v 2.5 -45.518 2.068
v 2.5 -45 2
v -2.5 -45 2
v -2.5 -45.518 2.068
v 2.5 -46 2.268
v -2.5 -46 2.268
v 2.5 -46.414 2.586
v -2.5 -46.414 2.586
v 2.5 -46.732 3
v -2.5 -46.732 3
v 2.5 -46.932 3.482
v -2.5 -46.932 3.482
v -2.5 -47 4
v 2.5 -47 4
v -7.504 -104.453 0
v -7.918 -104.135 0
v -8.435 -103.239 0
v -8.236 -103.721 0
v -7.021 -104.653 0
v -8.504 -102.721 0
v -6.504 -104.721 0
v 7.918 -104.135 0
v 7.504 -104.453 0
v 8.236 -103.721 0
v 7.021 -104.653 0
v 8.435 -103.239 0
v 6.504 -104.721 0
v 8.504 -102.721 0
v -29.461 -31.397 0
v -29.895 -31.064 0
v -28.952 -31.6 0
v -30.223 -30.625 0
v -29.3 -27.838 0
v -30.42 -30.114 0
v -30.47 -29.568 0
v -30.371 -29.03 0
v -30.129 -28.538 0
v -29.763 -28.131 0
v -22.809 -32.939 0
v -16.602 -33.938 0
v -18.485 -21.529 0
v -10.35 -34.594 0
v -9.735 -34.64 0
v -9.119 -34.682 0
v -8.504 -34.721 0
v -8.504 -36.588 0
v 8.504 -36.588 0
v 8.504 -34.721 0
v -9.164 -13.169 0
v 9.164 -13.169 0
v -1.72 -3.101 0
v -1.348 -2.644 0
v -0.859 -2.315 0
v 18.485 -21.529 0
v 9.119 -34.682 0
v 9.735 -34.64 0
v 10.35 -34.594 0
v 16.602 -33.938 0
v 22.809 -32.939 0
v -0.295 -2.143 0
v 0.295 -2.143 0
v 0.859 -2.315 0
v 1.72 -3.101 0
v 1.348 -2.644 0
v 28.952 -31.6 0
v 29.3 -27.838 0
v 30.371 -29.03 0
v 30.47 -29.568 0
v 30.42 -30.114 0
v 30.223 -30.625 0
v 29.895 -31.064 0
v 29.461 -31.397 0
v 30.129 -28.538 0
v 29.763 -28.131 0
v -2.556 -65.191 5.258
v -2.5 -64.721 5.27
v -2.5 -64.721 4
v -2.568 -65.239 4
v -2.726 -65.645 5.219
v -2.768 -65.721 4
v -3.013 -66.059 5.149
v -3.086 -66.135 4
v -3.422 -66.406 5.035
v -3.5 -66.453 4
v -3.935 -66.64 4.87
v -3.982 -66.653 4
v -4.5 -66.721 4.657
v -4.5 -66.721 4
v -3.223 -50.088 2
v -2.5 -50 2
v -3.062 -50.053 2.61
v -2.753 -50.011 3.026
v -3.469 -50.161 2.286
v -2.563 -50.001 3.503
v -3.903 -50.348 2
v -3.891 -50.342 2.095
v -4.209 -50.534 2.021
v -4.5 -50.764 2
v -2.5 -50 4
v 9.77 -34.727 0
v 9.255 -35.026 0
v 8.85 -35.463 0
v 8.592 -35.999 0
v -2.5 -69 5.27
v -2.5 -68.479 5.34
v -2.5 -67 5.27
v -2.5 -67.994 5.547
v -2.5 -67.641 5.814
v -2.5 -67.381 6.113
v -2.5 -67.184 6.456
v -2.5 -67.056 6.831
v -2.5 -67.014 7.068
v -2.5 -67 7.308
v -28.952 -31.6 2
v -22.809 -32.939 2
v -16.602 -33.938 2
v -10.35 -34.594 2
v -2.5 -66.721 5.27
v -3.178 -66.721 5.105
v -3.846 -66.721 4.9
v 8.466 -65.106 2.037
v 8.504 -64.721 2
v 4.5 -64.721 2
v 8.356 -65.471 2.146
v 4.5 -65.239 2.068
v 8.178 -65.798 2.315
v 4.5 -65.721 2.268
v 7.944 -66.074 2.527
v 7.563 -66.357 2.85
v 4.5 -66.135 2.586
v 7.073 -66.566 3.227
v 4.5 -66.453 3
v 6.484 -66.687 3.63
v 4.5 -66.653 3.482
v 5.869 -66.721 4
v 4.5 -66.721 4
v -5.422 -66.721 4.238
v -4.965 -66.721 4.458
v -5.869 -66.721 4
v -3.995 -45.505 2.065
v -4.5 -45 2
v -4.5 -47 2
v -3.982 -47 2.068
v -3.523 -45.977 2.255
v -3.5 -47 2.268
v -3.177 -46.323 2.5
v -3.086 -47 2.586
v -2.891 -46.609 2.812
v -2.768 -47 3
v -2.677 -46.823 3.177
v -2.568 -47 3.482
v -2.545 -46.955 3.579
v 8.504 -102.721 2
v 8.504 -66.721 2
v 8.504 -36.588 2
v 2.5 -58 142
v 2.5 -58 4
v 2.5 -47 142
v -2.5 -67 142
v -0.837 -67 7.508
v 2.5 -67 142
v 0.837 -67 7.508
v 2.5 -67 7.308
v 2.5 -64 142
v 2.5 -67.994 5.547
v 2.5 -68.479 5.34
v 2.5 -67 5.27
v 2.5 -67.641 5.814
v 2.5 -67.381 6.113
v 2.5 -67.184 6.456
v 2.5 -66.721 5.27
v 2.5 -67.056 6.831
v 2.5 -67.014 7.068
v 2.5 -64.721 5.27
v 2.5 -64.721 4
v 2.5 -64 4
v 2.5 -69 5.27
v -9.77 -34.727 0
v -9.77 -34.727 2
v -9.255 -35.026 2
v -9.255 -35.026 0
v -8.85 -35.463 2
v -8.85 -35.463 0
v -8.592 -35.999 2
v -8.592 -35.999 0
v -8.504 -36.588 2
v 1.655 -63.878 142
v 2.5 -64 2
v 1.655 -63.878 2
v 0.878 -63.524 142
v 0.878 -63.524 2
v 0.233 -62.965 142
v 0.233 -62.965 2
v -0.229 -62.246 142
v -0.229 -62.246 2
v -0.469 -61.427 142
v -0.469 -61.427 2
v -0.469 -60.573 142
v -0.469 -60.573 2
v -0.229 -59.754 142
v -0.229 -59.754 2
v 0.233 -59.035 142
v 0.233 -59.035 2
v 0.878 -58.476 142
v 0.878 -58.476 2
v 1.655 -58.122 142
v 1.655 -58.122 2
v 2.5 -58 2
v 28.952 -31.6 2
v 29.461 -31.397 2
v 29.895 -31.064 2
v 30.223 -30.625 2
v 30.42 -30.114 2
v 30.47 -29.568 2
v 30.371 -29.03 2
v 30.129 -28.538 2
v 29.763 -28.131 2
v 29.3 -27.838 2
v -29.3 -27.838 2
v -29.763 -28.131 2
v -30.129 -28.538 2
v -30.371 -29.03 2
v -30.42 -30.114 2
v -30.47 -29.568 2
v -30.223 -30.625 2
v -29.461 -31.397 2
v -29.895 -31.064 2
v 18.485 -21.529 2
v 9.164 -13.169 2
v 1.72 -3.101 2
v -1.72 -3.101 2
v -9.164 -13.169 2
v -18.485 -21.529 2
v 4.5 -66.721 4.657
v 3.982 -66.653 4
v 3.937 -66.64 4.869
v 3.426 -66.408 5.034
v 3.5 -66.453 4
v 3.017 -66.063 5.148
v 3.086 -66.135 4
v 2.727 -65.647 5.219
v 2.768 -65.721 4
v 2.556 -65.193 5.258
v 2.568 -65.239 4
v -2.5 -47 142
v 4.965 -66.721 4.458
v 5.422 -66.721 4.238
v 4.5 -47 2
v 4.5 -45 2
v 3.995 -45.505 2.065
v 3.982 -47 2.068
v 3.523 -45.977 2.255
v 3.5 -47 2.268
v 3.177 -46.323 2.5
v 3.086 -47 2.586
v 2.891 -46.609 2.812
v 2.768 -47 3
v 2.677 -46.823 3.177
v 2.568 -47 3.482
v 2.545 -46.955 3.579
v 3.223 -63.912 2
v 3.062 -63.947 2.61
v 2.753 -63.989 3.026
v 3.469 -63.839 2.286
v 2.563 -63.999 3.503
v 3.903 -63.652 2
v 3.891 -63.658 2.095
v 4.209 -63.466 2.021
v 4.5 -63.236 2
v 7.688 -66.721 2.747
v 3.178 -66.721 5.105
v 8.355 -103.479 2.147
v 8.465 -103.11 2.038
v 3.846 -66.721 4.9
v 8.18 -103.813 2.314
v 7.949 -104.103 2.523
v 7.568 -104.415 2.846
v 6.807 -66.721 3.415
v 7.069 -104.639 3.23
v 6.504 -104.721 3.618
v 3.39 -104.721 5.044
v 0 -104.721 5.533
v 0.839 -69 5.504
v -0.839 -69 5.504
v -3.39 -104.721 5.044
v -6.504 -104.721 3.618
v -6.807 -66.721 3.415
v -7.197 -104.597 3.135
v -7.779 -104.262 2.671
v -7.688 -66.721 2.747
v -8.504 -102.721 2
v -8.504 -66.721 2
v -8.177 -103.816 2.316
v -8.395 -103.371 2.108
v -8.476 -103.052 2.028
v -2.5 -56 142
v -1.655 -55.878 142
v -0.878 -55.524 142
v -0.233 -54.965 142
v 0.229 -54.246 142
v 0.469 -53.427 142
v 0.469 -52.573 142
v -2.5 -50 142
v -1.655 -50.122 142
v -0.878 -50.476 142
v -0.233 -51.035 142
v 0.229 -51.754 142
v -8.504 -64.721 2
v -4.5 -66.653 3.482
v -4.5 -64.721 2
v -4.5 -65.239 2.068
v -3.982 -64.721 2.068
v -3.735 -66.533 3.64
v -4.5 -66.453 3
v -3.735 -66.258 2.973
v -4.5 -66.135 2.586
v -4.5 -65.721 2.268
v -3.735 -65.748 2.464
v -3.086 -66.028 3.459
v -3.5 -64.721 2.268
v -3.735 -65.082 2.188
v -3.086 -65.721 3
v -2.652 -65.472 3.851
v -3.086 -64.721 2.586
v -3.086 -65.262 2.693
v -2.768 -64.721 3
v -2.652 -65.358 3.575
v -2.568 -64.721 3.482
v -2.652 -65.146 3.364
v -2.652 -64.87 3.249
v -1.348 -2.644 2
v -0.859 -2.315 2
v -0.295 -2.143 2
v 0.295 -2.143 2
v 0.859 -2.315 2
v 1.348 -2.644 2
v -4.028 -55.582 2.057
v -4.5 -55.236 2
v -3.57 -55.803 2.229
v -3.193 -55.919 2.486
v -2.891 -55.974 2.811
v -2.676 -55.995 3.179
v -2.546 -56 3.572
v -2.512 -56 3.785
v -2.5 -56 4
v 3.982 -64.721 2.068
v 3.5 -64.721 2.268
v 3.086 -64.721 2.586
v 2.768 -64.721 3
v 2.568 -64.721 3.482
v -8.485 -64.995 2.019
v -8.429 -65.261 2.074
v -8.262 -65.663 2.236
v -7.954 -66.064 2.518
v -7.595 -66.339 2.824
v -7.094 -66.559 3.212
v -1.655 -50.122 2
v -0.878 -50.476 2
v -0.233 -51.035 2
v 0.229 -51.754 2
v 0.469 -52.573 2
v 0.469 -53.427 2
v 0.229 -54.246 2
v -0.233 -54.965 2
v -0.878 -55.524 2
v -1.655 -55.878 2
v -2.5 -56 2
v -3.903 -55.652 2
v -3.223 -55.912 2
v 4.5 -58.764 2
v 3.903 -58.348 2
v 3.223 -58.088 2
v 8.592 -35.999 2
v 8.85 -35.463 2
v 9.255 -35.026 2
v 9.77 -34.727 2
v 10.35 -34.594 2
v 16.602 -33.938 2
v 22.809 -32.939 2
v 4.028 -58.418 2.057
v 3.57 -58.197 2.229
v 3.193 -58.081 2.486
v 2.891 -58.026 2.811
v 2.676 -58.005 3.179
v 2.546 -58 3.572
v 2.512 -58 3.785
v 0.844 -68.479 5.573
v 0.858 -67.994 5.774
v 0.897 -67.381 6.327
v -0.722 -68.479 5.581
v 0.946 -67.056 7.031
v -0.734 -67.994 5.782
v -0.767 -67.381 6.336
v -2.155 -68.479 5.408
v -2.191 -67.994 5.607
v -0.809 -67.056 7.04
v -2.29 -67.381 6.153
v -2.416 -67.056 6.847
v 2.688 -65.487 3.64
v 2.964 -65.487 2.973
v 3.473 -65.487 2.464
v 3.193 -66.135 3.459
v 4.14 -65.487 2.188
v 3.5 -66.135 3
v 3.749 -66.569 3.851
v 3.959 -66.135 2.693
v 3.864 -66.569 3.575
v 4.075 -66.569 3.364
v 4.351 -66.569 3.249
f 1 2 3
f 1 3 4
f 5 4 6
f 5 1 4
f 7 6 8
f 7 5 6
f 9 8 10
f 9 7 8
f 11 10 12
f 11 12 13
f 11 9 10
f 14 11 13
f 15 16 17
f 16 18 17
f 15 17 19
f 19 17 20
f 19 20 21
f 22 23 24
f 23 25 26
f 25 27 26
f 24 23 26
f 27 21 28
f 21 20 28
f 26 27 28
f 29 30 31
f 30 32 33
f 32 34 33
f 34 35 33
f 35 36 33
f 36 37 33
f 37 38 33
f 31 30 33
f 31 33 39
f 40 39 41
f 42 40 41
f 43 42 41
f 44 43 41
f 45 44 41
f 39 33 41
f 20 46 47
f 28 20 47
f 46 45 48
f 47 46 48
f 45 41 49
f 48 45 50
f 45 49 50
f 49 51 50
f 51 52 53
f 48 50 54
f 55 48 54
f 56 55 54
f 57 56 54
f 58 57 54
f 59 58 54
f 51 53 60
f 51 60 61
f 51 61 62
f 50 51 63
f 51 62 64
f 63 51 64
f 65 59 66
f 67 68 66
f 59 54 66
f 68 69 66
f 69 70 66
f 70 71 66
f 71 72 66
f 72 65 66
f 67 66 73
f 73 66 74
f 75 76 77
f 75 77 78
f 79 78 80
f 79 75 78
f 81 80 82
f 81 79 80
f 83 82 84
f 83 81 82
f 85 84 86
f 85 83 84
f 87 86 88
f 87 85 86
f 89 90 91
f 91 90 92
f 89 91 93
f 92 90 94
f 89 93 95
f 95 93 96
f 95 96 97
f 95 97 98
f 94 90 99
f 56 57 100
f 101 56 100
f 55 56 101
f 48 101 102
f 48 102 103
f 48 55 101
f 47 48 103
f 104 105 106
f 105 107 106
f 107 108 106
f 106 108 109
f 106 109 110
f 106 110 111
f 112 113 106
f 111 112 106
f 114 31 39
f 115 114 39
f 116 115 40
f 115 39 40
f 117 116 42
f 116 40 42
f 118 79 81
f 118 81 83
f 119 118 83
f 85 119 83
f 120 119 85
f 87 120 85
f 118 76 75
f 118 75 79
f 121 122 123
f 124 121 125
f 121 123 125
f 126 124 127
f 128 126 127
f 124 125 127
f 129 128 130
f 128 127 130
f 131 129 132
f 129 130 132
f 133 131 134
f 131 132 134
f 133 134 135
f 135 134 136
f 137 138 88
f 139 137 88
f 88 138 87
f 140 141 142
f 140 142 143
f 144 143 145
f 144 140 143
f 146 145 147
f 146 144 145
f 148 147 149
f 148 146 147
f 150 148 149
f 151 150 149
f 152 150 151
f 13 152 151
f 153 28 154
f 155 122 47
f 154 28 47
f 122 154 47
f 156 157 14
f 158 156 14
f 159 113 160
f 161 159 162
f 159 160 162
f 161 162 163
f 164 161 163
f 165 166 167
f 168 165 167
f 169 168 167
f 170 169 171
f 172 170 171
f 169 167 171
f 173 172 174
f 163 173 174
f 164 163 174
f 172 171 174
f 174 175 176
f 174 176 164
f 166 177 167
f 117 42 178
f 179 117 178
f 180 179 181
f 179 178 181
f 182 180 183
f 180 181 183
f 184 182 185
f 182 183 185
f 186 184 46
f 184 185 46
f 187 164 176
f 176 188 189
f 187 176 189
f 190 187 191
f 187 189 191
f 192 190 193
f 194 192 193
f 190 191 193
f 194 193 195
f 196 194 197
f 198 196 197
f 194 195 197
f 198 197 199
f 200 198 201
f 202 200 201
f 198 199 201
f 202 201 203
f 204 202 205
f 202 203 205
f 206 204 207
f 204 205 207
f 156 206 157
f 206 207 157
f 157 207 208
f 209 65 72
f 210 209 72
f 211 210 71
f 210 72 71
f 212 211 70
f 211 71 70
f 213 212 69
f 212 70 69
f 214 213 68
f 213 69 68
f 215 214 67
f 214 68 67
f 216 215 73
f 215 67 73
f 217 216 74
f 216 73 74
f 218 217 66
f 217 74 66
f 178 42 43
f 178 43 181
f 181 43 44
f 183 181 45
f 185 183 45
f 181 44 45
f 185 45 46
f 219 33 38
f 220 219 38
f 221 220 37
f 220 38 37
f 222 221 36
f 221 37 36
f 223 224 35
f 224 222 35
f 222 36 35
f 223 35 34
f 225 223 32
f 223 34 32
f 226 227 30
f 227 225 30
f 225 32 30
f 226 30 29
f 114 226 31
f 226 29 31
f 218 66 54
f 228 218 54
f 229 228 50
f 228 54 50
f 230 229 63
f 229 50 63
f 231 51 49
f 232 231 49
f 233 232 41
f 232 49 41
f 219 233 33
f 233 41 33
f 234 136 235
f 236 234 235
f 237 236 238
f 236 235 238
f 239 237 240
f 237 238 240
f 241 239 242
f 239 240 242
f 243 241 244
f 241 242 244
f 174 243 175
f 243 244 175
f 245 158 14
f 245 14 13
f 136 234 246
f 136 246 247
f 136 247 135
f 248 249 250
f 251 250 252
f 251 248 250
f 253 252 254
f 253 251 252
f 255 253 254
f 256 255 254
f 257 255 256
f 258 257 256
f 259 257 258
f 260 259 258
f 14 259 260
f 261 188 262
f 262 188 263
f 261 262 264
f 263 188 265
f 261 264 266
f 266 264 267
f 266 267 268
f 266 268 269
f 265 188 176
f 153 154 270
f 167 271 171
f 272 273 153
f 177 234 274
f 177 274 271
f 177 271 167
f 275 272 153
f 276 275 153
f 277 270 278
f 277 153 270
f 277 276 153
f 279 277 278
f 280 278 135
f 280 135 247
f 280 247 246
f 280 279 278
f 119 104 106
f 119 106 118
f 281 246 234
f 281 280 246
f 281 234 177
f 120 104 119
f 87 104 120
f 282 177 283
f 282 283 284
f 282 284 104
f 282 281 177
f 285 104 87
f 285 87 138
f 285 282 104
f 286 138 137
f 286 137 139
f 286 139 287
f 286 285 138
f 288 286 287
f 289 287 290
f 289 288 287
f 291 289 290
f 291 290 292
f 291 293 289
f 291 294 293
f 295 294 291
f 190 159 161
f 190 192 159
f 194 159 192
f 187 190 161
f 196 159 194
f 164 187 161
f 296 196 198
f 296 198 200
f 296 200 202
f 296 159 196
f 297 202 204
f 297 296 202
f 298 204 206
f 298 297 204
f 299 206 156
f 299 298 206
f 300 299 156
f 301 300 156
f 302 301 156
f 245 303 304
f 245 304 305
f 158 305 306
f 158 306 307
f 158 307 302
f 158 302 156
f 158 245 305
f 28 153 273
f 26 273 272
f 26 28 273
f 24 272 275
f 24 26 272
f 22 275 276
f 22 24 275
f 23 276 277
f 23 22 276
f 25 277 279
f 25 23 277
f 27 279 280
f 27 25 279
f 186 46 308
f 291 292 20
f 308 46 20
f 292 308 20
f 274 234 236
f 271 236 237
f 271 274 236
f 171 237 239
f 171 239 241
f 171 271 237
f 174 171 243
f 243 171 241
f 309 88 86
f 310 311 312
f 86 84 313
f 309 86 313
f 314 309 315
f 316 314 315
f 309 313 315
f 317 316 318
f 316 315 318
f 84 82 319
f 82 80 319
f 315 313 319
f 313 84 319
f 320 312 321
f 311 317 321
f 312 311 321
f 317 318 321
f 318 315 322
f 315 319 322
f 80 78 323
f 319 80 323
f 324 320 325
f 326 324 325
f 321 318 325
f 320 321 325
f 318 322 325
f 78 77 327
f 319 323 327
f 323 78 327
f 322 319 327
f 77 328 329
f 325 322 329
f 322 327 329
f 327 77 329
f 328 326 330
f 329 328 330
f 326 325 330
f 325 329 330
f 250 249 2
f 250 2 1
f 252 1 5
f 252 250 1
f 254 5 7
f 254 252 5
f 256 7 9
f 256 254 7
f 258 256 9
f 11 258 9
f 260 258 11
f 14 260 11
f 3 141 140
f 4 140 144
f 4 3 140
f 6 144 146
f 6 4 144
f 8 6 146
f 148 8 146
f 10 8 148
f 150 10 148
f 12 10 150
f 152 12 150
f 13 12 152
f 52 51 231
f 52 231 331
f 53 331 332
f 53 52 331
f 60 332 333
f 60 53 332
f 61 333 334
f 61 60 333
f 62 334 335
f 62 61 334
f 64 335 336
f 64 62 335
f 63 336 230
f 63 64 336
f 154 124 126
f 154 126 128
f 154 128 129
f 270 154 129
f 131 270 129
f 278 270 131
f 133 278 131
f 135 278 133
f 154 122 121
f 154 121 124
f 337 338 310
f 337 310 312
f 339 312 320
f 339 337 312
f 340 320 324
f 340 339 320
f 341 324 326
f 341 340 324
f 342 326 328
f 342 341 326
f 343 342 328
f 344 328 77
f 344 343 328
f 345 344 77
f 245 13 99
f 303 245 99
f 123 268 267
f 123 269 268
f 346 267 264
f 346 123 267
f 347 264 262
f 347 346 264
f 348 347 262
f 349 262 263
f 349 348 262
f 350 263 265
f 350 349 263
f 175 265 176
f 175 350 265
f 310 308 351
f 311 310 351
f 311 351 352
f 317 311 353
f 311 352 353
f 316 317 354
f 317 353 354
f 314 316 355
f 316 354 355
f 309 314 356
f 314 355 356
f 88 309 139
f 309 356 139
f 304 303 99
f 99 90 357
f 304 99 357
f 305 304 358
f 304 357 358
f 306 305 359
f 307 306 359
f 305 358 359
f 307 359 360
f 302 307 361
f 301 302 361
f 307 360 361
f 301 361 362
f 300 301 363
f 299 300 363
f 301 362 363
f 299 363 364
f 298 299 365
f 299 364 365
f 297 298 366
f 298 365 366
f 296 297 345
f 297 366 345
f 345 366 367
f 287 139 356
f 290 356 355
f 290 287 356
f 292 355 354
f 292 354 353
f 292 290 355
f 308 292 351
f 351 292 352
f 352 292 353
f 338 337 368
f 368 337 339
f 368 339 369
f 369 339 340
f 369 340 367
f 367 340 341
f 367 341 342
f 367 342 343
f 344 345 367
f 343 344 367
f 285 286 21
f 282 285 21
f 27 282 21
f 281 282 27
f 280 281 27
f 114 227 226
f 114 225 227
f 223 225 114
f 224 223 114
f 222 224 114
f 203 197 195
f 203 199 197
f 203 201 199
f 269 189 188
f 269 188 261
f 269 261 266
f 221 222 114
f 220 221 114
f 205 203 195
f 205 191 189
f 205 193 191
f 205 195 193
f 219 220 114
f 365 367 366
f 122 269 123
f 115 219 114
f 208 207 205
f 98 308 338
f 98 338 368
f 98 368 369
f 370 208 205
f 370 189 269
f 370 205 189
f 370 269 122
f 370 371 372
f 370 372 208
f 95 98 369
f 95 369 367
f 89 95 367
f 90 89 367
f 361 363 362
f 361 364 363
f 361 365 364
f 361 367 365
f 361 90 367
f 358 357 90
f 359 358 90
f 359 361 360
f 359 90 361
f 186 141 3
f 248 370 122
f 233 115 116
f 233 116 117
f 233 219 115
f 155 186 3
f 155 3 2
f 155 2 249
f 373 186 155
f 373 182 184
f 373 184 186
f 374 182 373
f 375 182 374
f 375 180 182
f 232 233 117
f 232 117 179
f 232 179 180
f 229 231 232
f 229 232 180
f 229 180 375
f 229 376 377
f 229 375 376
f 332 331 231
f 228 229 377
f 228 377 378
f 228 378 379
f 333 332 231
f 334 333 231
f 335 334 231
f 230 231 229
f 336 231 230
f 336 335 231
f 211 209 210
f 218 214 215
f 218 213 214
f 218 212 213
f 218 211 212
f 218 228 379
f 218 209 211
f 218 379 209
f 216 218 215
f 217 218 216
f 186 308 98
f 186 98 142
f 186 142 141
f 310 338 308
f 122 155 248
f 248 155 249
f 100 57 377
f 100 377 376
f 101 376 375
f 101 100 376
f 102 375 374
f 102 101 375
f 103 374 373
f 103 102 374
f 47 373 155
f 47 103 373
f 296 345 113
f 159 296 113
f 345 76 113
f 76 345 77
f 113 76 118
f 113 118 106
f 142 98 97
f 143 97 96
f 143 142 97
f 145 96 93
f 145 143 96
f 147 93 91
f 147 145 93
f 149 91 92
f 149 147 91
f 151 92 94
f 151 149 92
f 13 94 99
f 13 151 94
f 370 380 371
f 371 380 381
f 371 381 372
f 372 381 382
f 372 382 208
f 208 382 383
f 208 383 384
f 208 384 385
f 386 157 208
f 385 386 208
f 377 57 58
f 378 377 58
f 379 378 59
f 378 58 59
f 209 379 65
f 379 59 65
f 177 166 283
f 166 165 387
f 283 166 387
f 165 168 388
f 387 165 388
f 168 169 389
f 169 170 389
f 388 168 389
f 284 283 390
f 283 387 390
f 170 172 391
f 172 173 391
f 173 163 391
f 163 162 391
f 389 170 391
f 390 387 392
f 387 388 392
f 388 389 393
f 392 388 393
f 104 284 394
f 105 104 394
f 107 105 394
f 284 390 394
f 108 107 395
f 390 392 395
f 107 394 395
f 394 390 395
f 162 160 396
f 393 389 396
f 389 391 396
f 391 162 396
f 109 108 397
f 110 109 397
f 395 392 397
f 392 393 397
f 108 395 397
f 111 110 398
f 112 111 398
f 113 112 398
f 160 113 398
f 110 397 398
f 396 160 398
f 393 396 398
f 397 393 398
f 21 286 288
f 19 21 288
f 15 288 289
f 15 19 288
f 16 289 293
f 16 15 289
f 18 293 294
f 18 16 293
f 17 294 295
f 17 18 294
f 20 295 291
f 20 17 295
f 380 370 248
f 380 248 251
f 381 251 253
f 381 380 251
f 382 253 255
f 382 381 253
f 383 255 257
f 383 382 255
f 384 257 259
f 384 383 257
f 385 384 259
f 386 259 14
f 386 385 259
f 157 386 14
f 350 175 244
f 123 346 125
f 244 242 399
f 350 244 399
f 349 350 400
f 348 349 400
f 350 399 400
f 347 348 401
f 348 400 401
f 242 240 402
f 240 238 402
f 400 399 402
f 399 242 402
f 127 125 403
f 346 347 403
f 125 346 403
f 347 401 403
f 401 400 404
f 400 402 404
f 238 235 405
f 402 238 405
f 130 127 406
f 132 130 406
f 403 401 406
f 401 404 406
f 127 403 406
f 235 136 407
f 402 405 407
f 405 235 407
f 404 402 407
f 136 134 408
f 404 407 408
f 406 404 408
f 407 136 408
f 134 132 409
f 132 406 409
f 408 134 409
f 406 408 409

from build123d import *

# Parameters (mm, degrees)
F1_DEPTH      = 2
F3_DEPTH      = 140
F5_DEPTH      = 38
F6_S2_W       = 2
F6_S2_H       = 2
F6_T3_DEPTH   = 2
F6_S7_W       = 2
F6_S7_H       = 2
F6_T8_DEPTH   = 2
F6_T13_DEPTH  = 16
F6_S14_R      = 3
F6_T15_DEPTH  = 10
F6_T18_DEPTH  = 8
F6_S19_R      = 3
F6_T20_DEPTH  = 6
F6_T23_DEPTH  = 5
F6_T26_DEPTH  = 2
F6_T29_DEPTH  = 2
F6_T32_DEPTH  = 6.2698148841
F6_S33_R      = 12
F6_T34_DEPTH  = 5
F6_T37_DEPTH  = 4.0036432176
F6_S38_R      = 12
F6_T39_DEPTH  = 4
F6_T42_DEPTH  = 6.2698148841
F6_S43_R      = 12
F6_T44_DEPTH  = 5
F6_T47_DEPTH  = 4.0036432176
F6_S48_R      = 12
F6_T49_DEPTH  = 4
F6_T52_DEPTH  = 13.7211477996
F6_S53_R      = 3
F6_T54_DEPTH  = 9
F6_T57_DEPTH  = 5.7211477996
F6_S58_R      = 3
F6_T59_DEPTH  = 5
F6_T62_ANGLE  = 71.7972504735
F6_T68_DEPTH  = 21
F6_T72_DEPTH  = 10
F6_T78_DEPTH  = 10
F6_T82_DEPTH  = 13
F6_T88_DEPTH  = 12
F6_T91_DEPTH  = 12
F6_T94_DEPTH  = 32.0377713688
F6_T97_DEPTH  = 32.0377713688
F6_T100_DEPTH = 19.7312172526


# Not quite as in the source:
# - a fillet or chamfer that OpenCascade refuses, or shapes differently, is made with other operations: its cross-section is extruded or revolved along the edge and cut away or added


with BuildPart() as f1:
    # F0 (on Top) → F1 (new body)
    with BuildSketch(Plane.XY):
        with BuildLine():
            ThreePointArc((-34.7443990516, -30.0072931229), (-21.7619757905, -33.1321767709), (-8.5036432176, -34.7211477996))
            Line((-8.5036432176, -34.7211477996), (-8.5036432176, -104.7211477996))
            Line((-8.5036432176, -104.7211477996), (0, -104.7211477996))
            Line((0, -104.7211477996), (8.5036432176, -104.7211477996))
            Line((8.5036432176, -104.7211477996), (8.5036432176, -34.7211477996))
            ThreePointArc((8.5036432176, -34.7211477996), (21.7619757905, -33.1321767709), (34.7443990516, -30.0072931229))
            ThreePointArc((34.7443990516, -30.0072931229), (14.4817817228, -18.350360614), (0, 0))
            ThreePointArc((0, 0), (-14.4817817228, -18.350360614), (-34.7443990516, -30.0072931229))
        make_face()
    extrude(amount=F1_DEPTH)

    # F2 (on face) → F3 (join)
    with BuildSketch(Plane.XY.offset(2)):
        with BuildLine():
            Line((-2.5, -67), (2.5, -67))
            Line((2.5, -67), (2.5, -64))
            ThreePointArc((2.5, -64), (-0.5, -61), (2.5, -58))
            Line((2.5, -58), (2.5, -47))
            Line((2.5, -47), (-2.5, -47))
            Line((-2.5, -47), (-2.5, -50))
            ThreePointArc((-2.5, -50), (0.5, -53), (-2.5, -56))
            Line((-2.5, -56), (-2.5, -67))
        make_face()
    extrude(amount=F3_DEPTH)

    # F4 (on face) → F5 (join)
    with BuildSketch(Plane.XZ.offset(104.7211477996)):
        with BuildLine():
            ThreePointArc((8.5036432176, 2), (0, 5.5331202898), (-8.5036432176, 2))
            Line((-8.5036432176, 2), (8.5036432176, 2))
        make_face()
    extrude(amount=-F5_DEPTH)

    # F6: fillet of radius 2 on 17 edges, made by hand


with BuildPart() as f6_tool1:
    # F6_s2 → F6_t3 (new body)
    with BuildSketch(Plane.XZ.offset(64.7211477996)):
        with Locations((3.5, 3)):
            Rectangle(F6_S2_W, F6_S2_H)
    extrude(amount=F6_T3_DEPTH)

    # F6_s4 → F6_t5 (revolve, cut)
    with BuildSketch(Plane(origin=(4.5, -64.7211477996, 4), x_dir=(0.7071067812, 0, 0.7071067812), z_dir=(0.7071067812, 0, -0.7071067812))):
        with BuildLine():
            ThreePointArc((0, -2), (2, 0), (0, 2))
            Line((0, 2), (0, -2))
        make_face()
    revolve(axis=Axis((4.5, -64.7211477996, 4), (0, -1, 0)), mode=Mode.SUBTRACT)


with BuildPart() as f6_tool6:
    # F6_s7 → F6_t8 (new body)
    with BuildSketch(Plane.YZ.offset(-4.5)):
        with Locations((-65.7211477996, 3)):
            Rectangle(F6_S7_W, F6_S7_H)
    extrude(amount=F6_T8_DEPTH)

    # F6_s9 → F6_t10 (revolve, cut)
    with BuildSketch(Plane(origin=(-4.5, -64.7211477996, 4), x_dir=(0, 0.7071067812, 0.7071067812), z_dir=(0, 0.7071067812, -0.7071067812))):
        with BuildLine():
            ThreePointArc((0, -2), (2, 0), (0, 2))
            Line((0, 2), (0, -2))
        make_face()
    revolve(axis=Axis((-4.5, -64.7211477996, 4), (1, 0, 0)), mode=Mode.SUBTRACT)


with BuildPart() as f6_tool11:
    # F6_s12 → F6_t13 (new body)
    with BuildSketch(Plane.XZ.offset(63)):
        with BuildLine():
            ThreePointArc((4.5, 2), (3.0857864376, 2.5857864376), (2.5, 4))
            Line((2.5, 4), (2.5, 2))
            Line((2.5, 2), (4.5, 2))
        make_face()
    extrude(amount=-F6_T13_DEPTH)

    # F6_s14 → F6_t15 (cut, symmetric)
    with BuildSketch(Plane.XY.offset(3)):
        with Locations((2.5, -61)):
            Circle(F6_S14_R)
    extrude(amount=F6_T15_DEPTH, both=True, mode=Mode.SUBTRACT)


with BuildPart() as f6_tool16:
    # F6_s17 → F6_t18 (new body)
    with BuildSketch(Plane.XZ.offset(47)):
        with BuildLine():
            ThreePointArc((-4.5, 2), (-3.0857864376, 2.5857864376), (-2.5, 4))
            Line((-2.5, 4), (-2.5, 2))
            Line((-2.5, 2), (-4.5, 2))
        make_face()
    extrude(amount=F6_T18_DEPTH)

    # F6_s19 → F6_t20 (cut, symmetric)
    with BuildSketch(Plane.XY.offset(3)):
        with Locations((-2.5, -53)):
            Circle(F6_S19_R)
    extrude(amount=F6_T20_DEPTH, both=True, mode=Mode.SUBTRACT)


with BuildPart() as f6_tool21:
    # F6_s22 → F6_t23 (new body)
    with BuildSketch(Plane.YZ.offset(2.5)):
        with BuildLine():
            ThreePointArc((-45, 2), (-46.4142135624, 2.5857864376), (-47, 4))
            Line((-47, 4), (-47, 2))
            Line((-47, 2), (-45, 2))
        make_face()
    extrude(amount=-F6_T23_DEPTH)


with BuildPart() as f6_tool24:
    # F6_s25 → F6_t26 (new body)
    with BuildSketch(Plane.XY):
        with BuildLine():
            ThreePointArc((-10.349778168, -34.5937272007), (-9.0360380086, -35.2290743164), (-8.5036432176, -36.5877998039))
            Line((-8.5036432176, -36.5877998039), (-8.5036432176, -34.7211477996))
            ThreePointArc((-8.5036432176, -34.7211477996), (-9.4269686479, -34.6611748852), (-10.349778168, -34.5937272007))
        make_face()
    extrude(amount=F6_T26_DEPTH)


with BuildPart() as f6_tool27:
    # F6_s28 → F6_t29 (new body)
    with BuildSketch(Plane.XY):
        with BuildLine():
            ThreePointArc((10.349778168, -34.5937272007), (9.0360380086, -35.2290743164), (8.5036432176, -36.5877998039))
            Line((8.5036432176, -36.5877998039), (8.5036432176, -34.7211477996))
            ThreePointArc((8.5036432176, -34.7211477996), (9.4269686479, -34.6611748852), (10.349778168, -34.5937272007))
        make_face()
    extrude(amount=F6_T29_DEPTH)


with BuildPart() as f6_tool30:
    # F6_s31 → F6_t32 (new body)
    with BuildSketch(Plane.XY.offset(4)):
        with BuildLine():
            ThreePointArc((4.5, -66.7211477996), (3.0857864376, -66.135361362), (2.5, -64.7211477996))
            Line((2.5, -64.7211477996), (2.5, -66.7211477996))
            Line((2.5, -66.7211477996), (4.5, -66.7211477996))
        make_face()
    extrude(amount=F6_T32_DEPTH)

    # F6_s33 → F6_t34 (intersect, symmetric)
    with BuildSketch(Plane.XZ.offset(65.7)):
        with Locations((0, -6.4668797102)):
            Circle(F6_S33_R)
    extrude(amount=F6_T34_DEPTH, both=True, mode=Mode.INTERSECT)


with BuildPart() as f6_tool35:
    # F6_s36 → F6_t37 (new body)
    with BuildSketch(Plane.YZ.offset(4.5)):
        with BuildLine():
            ThreePointArc((-64.7211477996, 2), (-66.135361362, 2.5857864376), (-66.7211477996, 4))
            Line((-66.7211477996, 4), (-66.7211477996, 2))
            Line((-66.7211477996, 2), (-64.7211477996, 2))
        make_face()
    extrude(amount=F6_T37_DEPTH)

    # F6_s38 → F6_t39 (intersect, symmetric)
    with BuildSketch(Plane.XZ.offset(65.7)):
        with Locations((0, -6.4668797102)):
            Circle(F6_S38_R)
    extrude(amount=F6_T39_DEPTH, both=True, mode=Mode.INTERSECT)


with BuildPart() as f6_tool40:
    # F6_s41 → F6_t42 (new body)
    with BuildSketch(Plane.XY.offset(10.2698148841)):
        with BuildLine():
            ThreePointArc((-2.5, -64.7211477996), (-3.0857864376, -66.135361362), (-4.5, -66.7211477996))
            Line((-4.5, -66.7211477996), (-2.5, -66.7211477996))
            Line((-2.5, -66.7211477996), (-2.5, -64.7211477996))
        make_face()
    extrude(amount=-F6_T42_DEPTH)

    # F6_s43 → F6_t44 (intersect, symmetric)
    with BuildSketch(Plane.XZ.offset(65.7)):
        with Locations((0, -6.4668797102)):
            Circle(F6_S43_R)
    extrude(amount=F6_T44_DEPTH, both=True, mode=Mode.INTERSECT)


with BuildPart() as f6_tool45:
    # F6_s46 → F6_t47 (new body)
    with BuildSketch(Plane.YZ.offset(-8.5036432176)):
        with BuildLine():
            ThreePointArc((-64.7211477996, 2), (-66.135361362, 2.5857864376), (-66.7211477996, 4))
            Line((-66.7211477996, 4), (-66.7211477996, 2))
            Line((-66.7211477996, 2), (-64.7211477996, 2))
        make_face()
    extrude(amount=F6_T47_DEPTH)

    # F6_s48 → F6_t49 (intersect, symmetric)
    with BuildSketch(Plane.XZ.offset(65.7)):
        with Locations((0, -6.4668797102)):
            Circle(F6_S48_R)
    extrude(amount=F6_T49_DEPTH, both=True, mode=Mode.INTERSECT)


with BuildPart() as f6_tool50:
    # F6_s51 → F6_t52 (new body)
    with BuildSketch(Plane.XZ.offset(51)):
        with BuildLine():
            ThreePointArc((-4.5, 2), (-3.0857864376, 2.5857864376), (-2.5, 4))
            Line((-2.5, 4), (-2.5, 2))
            Line((-2.5, 2), (-4.5, 2))
        make_face()
    extrude(amount=F6_T52_DEPTH)

    # F6_s53 → F6_t54 (cut, symmetric)
    with BuildSketch(Plane.XY.offset(3)):
        with Locations((-2.5, -53)):
            Circle(F6_S53_R)
    extrude(amount=F6_T54_DEPTH, both=True, mode=Mode.SUBTRACT)


with BuildPart() as f6_tool55:
    # F6_s56 → F6_t57 (new body)
    with BuildSketch(Plane.XZ.offset(64.7211477996)):
        with BuildLine():
            ThreePointArc((4.5, 2), (3.0857864376, 2.5857864376), (2.5, 4))
            Line((2.5, 4), (2.5, 2))
            Line((2.5, 2), (4.5, 2))
        make_face()
    extrude(amount=-F6_T57_DEPTH)

    # F6_s58 → F6_t59 (cut, symmetric)
    with BuildSketch(Plane.XY.offset(3)):
        with Locations((2.5, -61)):
            Circle(F6_S58_R)
    extrude(amount=F6_T59_DEPTH, both=True, mode=Mode.SUBTRACT)


with BuildPart() as f6_tool60:
    # F6_s61 → F6_t62 (revolve)
    with BuildSketch(Plane(origin=(3.0716290249, 0, -2.2233762781), x_dir=(0, 1, 0), z_dir=(0.8100557097, 0, -0.5863529203))):
        with BuildLine():
            ThreePointArc((-69, 6.7614671667), (-67.5857864376, 7.3472536043), (-67, 8.7614671667))
            Line((-67, 8.7614671667), (-67, 6.7614671667))
            Line((-67, 6.7614671667), (-69, 6.7614671667))
        make_face()
    revolve(axis=Axis((0, -67, -6.4668797102), (0, -1, 0)), revolution_arc=F6_T62_ANGLE)

    split(bisect_by=Plane.YZ.offset(2.5), keep=Keep.BOTTOM)

    split(bisect_by=Plane.YZ.offset(-2.5), keep=Keep.TOP)


with BuildPart() as f6_tool66:
    # F6_s67 → F6_t68 (new body)
    with BuildSketch(Plane.XZ.offset(63)):
        with BuildLine():
            ThreePointArc((4.5, 2), (3.0857864376, 2.5857864376), (2.5, 4))
            Line((2.5, 4), (2.5, 2))
            Line((2.5, 2), (4.5, 2))
        make_face()
    extrude(amount=-F6_T68_DEPTH)

    split(bisect_by=Plane.XZ.offset(47), keep=Keep.BOTTOM)


with BuildPart() as f6_tool70:
    # F6_s71 → F6_t72 (new body)
    with BuildSketch(Plane.YZ.offset(7.5)):
        with BuildLine():
            ThreePointArc((-45, 2), (-46.4142135624, 2.5857864376), (-47, 4))
            Line((-47, 4), (-47, 2))
            Line((-47, 2), (-45, 2))
        make_face()
    extrude(amount=-F6_T72_DEPTH)

    split(bisect_by=Plane.YZ.offset(2.5), keep=Keep.TOP)


with BuildPart() as f6_tool66_1:
    add(f6_tool66.part)

    # F6_t74: intersect F6_tool70
    add(f6_tool70.part, mode=Mode.INTERSECT)


with BuildPart() as f6_tool76:
    # F6_s77 → F6_t78 (new body)
    with BuildSketch(Plane.YZ.offset(2.5)):
        with BuildLine():
            ThreePointArc((-45, 2), (-46.4142135624, 2.5857864376), (-47, 4))
            Line((-47, 4), (-47, 2))
            Line((-47, 2), (-45, 2))
        make_face()
    extrude(amount=-F6_T78_DEPTH)

    split(bisect_by=Plane.YZ.offset(-2.5), keep=Keep.BOTTOM)


with BuildPart() as f6_tool80:
    # F6_s81 → F6_t82 (new body)
    with BuildSketch(Plane.XZ.offset(42)):
        with BuildLine():
            ThreePointArc((-4.5, 2), (-3.0857864376, 2.5857864376), (-2.5, 4))
            Line((-2.5, 4), (-2.5, 2))
            Line((-2.5, 2), (-4.5, 2))
        make_face()
    extrude(amount=F6_T82_DEPTH)

    split(bisect_by=Plane.XZ.offset(47), keep=Keep.BOTTOM)


with BuildPart() as f6_tool76_1:
    add(f6_tool76.part)

    # F6_t84: intersect F6_tool80
    add(f6_tool80.part, mode=Mode.INTERSECT)


with BuildPart() as f1_1:
    add(f1.part)

    # F6_t85: union F6_tool1, F6_tool6, F6_tool11, F6_tool16, F6_tool21, F6_tool24, F6_tool27, F6_tool30, F6_tool35, F6_tool40, F6_tool45, F6_tool50, F6_tool55, F6_tool60, F6_tool66, F6_tool76
    add([f6_tool1.part, f6_tool6.part, f6_tool11.part, f6_tool16.part, f6_tool21.part, f6_tool24.part, f6_tool27.part, f6_tool30.part, f6_tool35.part, f6_tool40.part, f6_tool45.part, f6_tool50.part, f6_tool55.part, f6_tool60.part, f6_tool66_1.part, f6_tool76_1.part])


with BuildPart() as f6_tool86:
    # F6_s87 → F6_t88 (new body)
    with BuildSketch(Plane.XY.offset(-5)):
        with BuildLine():
            ThreePointArc((-6.5036432176, -104.7211477996), (-7.91785678, -104.135361362), (-8.5036432176, -102.7211477996))
            Line((-8.5036432176, -102.7211477996), (-8.5036432176, -104.7211477996))
            Line((-8.5036432176, -104.7211477996), (-6.5036432176, -104.7211477996))
        make_face()
    extrude(amount=F6_T88_DEPTH)


with BuildPart() as f6_tool89:
    # F6_s90 → F6_t91 (new body)
    with BuildSketch(Plane.XY.offset(-5)):
        with BuildLine():
            ThreePointArc((8.5036432176, -102.7211477996), (7.91785678, -104.135361362), (6.5036432176, -104.7211477996))
            Line((6.5036432176, -104.7211477996), (8.5036432176, -104.7211477996))
            Line((8.5036432176, -104.7211477996), (8.5036432176, -102.7211477996))
        make_face()
    extrude(amount=F6_T91_DEPTH)


with BuildPart() as f6_tool92:
    # F6_s93 → F6_t94 (new body)
    with BuildSketch(Plane.XY.offset(-15.0188856844)):
        with BuildLine():
            ThreePointArc((28.9519071991, -31.6003237222), (30.4639347839, -29.8429196175), (29.300045112, -27.8379115286))
            ThreePointArc((29.300045112, -27.8379115286), (31.9964862312, -28.987189893), (34.7443990516, -30.0072931229))
            ThreePointArc((34.7443990516, -30.0072931229), (31.8586243798, -30.8418834327), (28.9519071991, -31.6003237222))
        make_face()
    extrude(amount=F6_T94_DEPTH)


with BuildPart() as f6_tool95:
    # F6_s96 → F6_t97 (new body)
    with BuildSketch(Plane.XY.offset(-15.0188856844)):
        with BuildLine():
            ThreePointArc((-29.300045112, -27.8379115286), (-30.4639347839, -29.8429196175), (-28.9519071991, -31.6003237222))
            ThreePointArc((-28.9519071991, -31.6003237222), (-31.8586243798, -30.8418834327), (-34.7443990516, -30.0072931229))
            ThreePointArc((-34.7443990516, -30.0072931229), (-31.9964862312, -28.987189893), (-29.300045112, -27.8379115286))
        make_face()
    extrude(amount=F6_T97_DEPTH)


with BuildPart() as f6_tool98:
    # F6_s99 → F6_t100 (new body)
    with BuildSketch(Plane.XY.offset(-8.8656086263)):
        with BuildLine():
            ThreePointArc((-1.7203370706, -3.1010132173), (0, -2.1210330032), (1.7203370706, -3.1010132173))
            ThreePointArc((1.7203370706, -3.1010132173), (0.8379162788, -1.5628514066), (0, 0))
            ThreePointArc((0, 0), (-0.8379162788, -1.5628514066), (-1.7203370706, -3.1010132173))
        make_face()
    extrude(amount=F6_T100_DEPTH)


with BuildPart() as f1_2:
    add(f1_1.part)

    # F6_t101: cut F6_tool86, F6_tool89, F6_tool92, F6_tool95, F6_tool98
    add([f6_tool86.part, f6_tool89.part, f6_tool92.part, f6_tool95.part, f6_tool98.part], mode=Mode.SUBTRACT)


solid = f1_2.part
